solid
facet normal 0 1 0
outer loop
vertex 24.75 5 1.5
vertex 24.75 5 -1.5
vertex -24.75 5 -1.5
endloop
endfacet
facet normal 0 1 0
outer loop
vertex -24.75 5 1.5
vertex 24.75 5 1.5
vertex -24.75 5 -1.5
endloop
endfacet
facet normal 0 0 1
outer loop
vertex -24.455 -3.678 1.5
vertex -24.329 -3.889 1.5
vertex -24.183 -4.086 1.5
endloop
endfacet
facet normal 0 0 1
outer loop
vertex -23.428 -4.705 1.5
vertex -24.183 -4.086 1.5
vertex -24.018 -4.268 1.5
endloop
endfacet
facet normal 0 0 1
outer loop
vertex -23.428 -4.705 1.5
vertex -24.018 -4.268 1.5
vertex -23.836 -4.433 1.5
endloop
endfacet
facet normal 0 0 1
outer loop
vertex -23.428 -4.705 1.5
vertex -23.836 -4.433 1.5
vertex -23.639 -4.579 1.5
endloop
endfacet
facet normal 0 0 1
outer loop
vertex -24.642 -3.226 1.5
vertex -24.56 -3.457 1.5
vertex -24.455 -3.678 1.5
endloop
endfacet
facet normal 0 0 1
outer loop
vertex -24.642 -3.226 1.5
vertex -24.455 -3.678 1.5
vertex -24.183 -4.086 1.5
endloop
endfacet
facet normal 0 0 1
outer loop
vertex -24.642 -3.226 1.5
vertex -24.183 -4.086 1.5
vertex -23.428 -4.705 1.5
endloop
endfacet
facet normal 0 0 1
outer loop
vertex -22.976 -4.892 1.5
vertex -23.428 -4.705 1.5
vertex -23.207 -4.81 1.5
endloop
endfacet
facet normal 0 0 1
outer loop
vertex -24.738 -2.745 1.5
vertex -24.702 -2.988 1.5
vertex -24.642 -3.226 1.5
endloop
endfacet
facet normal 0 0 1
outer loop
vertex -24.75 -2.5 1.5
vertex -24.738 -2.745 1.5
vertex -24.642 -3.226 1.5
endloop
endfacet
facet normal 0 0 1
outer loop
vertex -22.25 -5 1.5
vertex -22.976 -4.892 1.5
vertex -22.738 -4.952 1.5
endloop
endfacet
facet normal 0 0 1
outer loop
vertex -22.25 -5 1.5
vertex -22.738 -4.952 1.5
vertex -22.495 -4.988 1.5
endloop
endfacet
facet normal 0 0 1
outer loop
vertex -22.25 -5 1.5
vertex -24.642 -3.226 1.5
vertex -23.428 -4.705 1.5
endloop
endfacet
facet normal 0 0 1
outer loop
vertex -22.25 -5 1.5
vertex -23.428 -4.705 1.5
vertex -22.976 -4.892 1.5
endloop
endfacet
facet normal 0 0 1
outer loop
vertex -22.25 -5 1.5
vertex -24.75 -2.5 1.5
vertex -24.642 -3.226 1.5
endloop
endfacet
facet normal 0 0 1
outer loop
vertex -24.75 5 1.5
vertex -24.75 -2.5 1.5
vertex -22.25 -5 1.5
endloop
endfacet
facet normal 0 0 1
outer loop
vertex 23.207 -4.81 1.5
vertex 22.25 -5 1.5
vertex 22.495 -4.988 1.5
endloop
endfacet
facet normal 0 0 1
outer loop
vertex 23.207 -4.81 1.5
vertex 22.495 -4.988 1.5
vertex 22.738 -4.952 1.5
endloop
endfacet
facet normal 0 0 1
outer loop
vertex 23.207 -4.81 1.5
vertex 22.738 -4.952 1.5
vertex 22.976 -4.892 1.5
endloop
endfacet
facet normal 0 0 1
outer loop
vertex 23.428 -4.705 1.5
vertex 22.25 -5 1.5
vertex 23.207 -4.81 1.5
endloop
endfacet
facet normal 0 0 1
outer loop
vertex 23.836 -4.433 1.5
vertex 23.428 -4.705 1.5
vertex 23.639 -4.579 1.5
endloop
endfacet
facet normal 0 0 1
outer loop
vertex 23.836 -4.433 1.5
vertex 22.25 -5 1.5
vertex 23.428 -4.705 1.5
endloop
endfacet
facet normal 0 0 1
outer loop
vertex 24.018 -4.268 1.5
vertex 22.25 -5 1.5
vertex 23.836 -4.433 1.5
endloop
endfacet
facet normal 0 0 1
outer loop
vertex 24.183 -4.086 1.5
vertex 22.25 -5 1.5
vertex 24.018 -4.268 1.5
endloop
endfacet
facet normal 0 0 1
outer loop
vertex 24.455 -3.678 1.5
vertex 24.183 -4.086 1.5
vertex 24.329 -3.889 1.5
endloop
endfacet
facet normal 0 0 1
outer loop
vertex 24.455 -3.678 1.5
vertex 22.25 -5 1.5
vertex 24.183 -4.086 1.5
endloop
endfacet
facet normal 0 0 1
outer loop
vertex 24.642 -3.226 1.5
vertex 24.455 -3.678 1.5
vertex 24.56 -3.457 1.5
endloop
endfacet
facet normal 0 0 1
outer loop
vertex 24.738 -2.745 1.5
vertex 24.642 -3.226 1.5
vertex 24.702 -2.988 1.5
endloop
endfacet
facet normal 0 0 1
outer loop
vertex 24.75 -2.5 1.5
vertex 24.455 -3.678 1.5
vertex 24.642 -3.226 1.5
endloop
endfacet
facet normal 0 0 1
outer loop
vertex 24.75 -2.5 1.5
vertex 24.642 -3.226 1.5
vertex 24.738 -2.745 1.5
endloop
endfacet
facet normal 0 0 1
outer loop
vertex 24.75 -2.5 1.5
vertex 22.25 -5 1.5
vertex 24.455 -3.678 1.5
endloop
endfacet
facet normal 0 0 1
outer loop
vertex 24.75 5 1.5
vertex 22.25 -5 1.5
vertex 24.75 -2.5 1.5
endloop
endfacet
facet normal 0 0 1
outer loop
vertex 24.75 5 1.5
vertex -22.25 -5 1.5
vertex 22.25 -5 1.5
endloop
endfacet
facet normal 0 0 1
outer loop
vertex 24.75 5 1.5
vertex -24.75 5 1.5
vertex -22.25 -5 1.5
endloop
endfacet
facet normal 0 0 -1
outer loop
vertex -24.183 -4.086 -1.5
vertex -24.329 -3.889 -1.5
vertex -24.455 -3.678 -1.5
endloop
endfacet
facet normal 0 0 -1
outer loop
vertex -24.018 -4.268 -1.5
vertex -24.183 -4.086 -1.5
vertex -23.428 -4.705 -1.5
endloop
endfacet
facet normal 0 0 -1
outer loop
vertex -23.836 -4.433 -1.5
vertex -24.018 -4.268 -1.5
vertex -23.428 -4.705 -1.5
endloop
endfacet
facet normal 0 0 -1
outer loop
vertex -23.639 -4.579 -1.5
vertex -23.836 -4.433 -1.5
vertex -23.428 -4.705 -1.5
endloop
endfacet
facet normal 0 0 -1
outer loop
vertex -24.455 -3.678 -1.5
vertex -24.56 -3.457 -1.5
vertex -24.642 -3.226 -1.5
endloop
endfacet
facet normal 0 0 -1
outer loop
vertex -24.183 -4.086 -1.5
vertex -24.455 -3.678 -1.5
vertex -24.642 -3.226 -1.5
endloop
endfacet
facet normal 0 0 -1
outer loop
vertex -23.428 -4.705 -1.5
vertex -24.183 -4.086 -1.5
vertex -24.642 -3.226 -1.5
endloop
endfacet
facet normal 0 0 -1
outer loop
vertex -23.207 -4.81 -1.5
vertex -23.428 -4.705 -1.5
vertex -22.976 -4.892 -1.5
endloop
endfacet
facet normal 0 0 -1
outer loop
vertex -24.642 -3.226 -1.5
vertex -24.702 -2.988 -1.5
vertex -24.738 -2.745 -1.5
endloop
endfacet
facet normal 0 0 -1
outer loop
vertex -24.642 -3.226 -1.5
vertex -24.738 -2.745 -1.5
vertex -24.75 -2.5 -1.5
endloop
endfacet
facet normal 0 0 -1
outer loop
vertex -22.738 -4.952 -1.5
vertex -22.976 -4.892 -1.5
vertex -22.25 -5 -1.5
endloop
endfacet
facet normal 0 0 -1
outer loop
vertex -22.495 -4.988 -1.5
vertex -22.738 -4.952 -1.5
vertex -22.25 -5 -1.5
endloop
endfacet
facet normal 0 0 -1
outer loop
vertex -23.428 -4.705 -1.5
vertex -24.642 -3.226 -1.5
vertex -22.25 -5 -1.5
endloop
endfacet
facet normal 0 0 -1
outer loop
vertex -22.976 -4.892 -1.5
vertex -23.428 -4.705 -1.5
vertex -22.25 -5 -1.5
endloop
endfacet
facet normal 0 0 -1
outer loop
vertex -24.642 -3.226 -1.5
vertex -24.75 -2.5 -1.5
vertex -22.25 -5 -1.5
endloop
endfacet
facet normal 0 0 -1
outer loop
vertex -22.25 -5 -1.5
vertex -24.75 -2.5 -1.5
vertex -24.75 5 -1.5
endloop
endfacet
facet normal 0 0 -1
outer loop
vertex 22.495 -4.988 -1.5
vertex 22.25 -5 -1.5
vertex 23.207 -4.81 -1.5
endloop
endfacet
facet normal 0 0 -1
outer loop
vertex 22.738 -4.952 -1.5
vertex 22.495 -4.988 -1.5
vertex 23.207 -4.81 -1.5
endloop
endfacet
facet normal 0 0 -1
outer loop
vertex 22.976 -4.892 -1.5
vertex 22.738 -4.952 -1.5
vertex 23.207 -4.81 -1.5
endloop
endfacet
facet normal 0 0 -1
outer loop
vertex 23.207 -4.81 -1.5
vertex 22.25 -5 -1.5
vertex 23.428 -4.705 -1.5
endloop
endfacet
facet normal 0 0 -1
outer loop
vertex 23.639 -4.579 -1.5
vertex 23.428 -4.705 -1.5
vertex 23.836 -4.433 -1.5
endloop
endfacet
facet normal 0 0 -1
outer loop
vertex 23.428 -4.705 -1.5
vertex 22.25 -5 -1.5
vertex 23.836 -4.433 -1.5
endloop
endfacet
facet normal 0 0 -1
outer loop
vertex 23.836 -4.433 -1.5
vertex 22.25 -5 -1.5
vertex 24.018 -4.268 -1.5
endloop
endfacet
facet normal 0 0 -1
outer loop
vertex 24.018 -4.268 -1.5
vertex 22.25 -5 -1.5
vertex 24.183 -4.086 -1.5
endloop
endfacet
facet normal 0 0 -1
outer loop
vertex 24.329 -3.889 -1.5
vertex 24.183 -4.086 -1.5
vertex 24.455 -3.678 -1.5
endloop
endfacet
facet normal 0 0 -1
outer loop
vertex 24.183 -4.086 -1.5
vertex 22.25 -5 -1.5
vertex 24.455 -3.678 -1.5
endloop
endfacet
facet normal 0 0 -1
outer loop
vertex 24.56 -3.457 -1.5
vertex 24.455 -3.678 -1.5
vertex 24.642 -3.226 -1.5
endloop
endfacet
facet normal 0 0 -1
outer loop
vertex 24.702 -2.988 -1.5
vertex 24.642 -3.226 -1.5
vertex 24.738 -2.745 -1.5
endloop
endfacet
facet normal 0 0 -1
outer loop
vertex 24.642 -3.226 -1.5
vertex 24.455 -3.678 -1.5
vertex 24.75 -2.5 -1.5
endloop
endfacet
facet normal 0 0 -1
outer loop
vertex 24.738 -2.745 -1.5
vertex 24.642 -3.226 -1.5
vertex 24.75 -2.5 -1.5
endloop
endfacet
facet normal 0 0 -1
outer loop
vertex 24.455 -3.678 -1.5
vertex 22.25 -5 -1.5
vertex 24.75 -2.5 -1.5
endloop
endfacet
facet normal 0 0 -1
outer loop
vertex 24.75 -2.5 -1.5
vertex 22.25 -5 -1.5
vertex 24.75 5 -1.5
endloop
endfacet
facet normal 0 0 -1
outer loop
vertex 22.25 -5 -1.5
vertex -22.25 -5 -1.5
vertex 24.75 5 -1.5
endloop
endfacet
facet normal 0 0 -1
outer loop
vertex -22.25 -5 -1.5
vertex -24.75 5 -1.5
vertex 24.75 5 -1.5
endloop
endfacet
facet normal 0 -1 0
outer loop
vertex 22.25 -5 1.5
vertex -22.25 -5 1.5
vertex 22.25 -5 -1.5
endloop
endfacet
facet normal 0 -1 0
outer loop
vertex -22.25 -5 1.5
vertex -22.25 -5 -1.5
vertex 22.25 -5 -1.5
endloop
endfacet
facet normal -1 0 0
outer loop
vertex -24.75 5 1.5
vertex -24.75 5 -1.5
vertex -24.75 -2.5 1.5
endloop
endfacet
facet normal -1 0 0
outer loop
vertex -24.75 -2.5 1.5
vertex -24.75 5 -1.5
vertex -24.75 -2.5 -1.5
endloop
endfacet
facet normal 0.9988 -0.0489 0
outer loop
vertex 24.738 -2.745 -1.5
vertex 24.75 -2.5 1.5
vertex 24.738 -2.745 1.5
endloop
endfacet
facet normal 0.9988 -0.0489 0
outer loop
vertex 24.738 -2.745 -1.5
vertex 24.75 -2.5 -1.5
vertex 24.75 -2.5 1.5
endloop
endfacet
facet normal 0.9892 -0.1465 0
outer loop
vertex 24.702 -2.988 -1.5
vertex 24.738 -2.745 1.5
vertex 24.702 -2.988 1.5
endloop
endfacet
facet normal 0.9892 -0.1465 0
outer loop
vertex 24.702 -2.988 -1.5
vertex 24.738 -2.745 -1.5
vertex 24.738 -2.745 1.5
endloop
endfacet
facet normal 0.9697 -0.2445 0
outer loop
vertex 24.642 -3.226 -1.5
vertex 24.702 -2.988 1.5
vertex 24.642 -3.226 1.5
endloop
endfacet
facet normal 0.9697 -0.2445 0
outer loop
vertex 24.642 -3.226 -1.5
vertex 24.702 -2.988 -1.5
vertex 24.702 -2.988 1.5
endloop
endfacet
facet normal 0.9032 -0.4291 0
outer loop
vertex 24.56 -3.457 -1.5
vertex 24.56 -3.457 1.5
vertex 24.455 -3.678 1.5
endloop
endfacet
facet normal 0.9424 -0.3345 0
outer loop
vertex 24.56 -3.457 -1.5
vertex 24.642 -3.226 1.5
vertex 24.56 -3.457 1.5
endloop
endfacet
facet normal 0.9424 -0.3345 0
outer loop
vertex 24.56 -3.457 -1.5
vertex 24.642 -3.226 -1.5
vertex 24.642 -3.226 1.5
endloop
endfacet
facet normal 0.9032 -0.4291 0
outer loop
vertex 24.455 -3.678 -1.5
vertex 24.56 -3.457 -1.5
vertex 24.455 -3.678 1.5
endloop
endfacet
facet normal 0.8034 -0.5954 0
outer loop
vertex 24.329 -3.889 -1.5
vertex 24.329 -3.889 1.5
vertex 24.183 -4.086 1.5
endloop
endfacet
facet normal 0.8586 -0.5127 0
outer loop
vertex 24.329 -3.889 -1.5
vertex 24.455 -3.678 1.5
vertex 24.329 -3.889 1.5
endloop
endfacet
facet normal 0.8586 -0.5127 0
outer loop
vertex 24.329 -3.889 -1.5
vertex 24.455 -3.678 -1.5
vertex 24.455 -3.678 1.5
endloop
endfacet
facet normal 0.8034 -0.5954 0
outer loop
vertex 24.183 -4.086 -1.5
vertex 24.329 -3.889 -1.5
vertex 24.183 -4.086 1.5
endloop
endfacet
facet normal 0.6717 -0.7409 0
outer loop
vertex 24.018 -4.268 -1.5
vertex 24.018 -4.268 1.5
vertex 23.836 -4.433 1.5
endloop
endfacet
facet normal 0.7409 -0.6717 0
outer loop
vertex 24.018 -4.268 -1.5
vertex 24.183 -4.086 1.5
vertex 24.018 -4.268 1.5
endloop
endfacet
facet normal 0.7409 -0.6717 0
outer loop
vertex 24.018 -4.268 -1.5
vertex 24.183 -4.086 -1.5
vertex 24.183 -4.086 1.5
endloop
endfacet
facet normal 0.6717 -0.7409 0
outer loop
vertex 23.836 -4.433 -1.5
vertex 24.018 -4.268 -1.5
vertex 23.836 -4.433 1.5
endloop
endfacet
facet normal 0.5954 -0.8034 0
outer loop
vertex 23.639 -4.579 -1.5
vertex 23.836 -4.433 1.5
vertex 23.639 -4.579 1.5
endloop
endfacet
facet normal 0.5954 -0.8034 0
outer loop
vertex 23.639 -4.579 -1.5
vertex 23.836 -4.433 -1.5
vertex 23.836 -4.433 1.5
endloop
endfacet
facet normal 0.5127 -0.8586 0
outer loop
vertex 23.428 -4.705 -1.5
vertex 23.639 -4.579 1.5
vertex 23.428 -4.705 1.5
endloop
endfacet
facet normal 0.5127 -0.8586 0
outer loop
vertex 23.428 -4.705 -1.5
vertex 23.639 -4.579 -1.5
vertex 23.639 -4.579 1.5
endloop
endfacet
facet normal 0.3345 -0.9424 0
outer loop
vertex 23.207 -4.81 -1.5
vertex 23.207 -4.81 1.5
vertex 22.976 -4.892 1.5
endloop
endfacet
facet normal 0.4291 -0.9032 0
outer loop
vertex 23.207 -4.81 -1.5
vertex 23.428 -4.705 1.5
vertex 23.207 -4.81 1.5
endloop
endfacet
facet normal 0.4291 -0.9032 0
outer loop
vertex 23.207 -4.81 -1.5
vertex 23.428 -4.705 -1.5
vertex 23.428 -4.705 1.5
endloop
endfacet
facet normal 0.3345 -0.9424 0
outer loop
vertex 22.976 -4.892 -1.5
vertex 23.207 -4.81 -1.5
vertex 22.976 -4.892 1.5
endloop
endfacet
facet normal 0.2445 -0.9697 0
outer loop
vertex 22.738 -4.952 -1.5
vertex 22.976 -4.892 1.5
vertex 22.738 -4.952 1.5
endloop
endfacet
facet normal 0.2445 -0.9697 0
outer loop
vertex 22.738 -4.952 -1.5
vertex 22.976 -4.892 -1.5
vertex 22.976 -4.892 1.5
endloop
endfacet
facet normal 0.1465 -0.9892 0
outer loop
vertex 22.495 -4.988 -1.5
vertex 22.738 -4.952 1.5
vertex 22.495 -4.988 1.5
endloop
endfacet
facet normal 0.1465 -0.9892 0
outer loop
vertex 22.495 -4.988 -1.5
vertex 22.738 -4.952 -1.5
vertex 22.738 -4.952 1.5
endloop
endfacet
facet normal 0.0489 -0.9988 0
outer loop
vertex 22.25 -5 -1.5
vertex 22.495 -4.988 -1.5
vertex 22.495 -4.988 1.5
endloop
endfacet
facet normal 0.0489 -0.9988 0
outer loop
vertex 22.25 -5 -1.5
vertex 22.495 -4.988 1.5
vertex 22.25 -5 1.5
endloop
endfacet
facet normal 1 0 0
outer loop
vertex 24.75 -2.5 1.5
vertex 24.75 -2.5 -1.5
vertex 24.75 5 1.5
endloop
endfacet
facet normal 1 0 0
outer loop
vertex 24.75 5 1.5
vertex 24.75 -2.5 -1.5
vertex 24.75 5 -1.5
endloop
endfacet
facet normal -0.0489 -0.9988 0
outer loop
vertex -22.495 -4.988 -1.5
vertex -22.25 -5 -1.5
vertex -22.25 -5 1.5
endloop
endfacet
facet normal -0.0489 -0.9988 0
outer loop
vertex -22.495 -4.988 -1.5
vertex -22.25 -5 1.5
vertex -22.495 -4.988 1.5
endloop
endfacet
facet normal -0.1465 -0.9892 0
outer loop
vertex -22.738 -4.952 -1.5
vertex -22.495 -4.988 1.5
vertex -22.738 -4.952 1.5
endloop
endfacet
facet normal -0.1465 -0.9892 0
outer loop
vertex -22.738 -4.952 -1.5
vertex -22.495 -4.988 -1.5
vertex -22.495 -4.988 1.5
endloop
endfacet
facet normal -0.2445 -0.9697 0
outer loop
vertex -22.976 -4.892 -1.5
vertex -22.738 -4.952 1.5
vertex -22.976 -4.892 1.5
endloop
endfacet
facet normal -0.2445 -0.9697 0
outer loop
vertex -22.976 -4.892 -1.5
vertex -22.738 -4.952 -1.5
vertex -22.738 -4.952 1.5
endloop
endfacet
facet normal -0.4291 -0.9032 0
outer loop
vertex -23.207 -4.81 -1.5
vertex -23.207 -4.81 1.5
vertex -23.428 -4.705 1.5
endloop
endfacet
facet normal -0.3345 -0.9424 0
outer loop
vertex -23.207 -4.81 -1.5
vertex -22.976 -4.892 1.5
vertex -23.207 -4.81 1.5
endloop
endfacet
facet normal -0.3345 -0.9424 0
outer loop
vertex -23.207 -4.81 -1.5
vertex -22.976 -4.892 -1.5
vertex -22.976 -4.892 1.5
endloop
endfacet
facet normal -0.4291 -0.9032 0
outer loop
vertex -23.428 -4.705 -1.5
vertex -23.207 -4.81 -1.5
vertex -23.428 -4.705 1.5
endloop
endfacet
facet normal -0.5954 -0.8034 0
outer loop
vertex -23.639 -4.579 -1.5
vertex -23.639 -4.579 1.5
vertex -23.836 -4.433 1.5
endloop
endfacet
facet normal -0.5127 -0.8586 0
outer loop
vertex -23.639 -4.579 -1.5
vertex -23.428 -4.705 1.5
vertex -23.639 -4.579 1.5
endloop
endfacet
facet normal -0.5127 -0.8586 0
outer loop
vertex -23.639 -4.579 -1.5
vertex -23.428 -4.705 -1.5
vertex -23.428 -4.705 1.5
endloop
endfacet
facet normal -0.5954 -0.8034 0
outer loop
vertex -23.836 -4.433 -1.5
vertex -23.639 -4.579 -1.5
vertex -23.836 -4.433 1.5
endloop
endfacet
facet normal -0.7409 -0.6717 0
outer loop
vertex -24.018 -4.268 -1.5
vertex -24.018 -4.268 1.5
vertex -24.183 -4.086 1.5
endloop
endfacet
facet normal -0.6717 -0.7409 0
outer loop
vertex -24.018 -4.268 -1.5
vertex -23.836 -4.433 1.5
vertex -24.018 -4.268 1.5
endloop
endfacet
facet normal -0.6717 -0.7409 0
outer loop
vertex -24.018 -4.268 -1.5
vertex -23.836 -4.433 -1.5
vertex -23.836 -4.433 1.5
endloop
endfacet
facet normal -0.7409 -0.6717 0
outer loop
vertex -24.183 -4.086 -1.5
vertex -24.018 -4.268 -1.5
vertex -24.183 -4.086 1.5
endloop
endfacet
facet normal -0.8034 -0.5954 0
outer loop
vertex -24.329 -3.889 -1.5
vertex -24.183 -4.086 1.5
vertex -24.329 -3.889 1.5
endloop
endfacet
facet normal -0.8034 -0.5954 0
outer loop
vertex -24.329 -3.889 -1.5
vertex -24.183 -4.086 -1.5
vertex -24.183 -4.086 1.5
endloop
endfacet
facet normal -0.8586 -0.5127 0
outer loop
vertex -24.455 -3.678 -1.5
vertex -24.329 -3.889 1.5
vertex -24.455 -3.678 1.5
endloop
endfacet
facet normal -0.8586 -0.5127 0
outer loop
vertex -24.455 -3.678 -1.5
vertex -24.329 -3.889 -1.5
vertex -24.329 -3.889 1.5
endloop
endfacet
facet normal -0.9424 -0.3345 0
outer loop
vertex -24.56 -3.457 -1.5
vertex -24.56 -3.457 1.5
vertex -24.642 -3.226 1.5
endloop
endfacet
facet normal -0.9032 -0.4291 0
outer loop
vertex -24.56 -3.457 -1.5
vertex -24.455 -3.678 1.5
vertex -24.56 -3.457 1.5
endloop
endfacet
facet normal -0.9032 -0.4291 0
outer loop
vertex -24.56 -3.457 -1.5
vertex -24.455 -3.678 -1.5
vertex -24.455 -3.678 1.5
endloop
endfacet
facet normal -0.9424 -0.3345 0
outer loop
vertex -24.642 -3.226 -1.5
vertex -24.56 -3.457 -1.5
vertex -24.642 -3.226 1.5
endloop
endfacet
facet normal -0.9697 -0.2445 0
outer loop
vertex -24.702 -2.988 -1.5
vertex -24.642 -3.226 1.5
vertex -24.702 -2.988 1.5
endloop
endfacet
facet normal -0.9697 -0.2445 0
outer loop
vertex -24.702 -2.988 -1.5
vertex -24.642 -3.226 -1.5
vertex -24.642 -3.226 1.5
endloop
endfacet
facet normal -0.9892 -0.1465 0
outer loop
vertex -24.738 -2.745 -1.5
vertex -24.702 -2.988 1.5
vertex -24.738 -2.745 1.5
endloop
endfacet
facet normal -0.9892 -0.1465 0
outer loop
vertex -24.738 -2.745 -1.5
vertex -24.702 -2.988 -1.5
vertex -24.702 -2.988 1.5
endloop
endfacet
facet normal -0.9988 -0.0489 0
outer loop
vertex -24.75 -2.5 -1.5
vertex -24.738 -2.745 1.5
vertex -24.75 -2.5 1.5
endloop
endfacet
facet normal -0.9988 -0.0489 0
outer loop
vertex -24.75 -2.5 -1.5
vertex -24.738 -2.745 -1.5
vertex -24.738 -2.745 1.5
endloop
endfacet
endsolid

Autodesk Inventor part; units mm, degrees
ref_plane "YZ Plane" through (0, 0, 0) normal (1, 0, 0) x (0, 1, 0)
ref_plane "XZ Plane" through (0, 0, 0) normal (0, 1, 0) x (-1, 0, 0)
ref_plane "XY Plane" through (0, 0, 0) normal (0, 0, 1) x (1, 0, 0)
sketch "草圖1" plane through (0, 0, 0) normal (0, 0, 1) x (1, 0, 0)
  line L0 (0, 0) -> (-24.9363, 0) construction
  line L1 (0, 0) -> (0, 24.1407) construction
  line L2 (-22.25, -5) -> (22.25, -5)
  line L3 (24.75, -2.5) -> (24.75, 5)
  line L4 (24.75, 5) -> (-24.75, 5)
  line L5 (-24.75, 5) -> (-24.75, -2.5)
  line L6 (-24.75, -5) -> (24.75, 5) construction
  line L7 (24.75, -5) -> (-24.75, 5) construction
  arc A0 (22.25, -5) -> (24.75, -2.5) centre (22.25, -2.5) ccw
  arc A1 (-24.75, -2.5) -> (-22.25, -5) centre (-22.25, -2.5) ccw
  dimension "d0" = 49.5
  dimension "d1" = 10
  dimension "d4" = 2.5
extrude "擠出1" add sketch "草圖1" along normal mid plane 3
properties part number "0 零件"
